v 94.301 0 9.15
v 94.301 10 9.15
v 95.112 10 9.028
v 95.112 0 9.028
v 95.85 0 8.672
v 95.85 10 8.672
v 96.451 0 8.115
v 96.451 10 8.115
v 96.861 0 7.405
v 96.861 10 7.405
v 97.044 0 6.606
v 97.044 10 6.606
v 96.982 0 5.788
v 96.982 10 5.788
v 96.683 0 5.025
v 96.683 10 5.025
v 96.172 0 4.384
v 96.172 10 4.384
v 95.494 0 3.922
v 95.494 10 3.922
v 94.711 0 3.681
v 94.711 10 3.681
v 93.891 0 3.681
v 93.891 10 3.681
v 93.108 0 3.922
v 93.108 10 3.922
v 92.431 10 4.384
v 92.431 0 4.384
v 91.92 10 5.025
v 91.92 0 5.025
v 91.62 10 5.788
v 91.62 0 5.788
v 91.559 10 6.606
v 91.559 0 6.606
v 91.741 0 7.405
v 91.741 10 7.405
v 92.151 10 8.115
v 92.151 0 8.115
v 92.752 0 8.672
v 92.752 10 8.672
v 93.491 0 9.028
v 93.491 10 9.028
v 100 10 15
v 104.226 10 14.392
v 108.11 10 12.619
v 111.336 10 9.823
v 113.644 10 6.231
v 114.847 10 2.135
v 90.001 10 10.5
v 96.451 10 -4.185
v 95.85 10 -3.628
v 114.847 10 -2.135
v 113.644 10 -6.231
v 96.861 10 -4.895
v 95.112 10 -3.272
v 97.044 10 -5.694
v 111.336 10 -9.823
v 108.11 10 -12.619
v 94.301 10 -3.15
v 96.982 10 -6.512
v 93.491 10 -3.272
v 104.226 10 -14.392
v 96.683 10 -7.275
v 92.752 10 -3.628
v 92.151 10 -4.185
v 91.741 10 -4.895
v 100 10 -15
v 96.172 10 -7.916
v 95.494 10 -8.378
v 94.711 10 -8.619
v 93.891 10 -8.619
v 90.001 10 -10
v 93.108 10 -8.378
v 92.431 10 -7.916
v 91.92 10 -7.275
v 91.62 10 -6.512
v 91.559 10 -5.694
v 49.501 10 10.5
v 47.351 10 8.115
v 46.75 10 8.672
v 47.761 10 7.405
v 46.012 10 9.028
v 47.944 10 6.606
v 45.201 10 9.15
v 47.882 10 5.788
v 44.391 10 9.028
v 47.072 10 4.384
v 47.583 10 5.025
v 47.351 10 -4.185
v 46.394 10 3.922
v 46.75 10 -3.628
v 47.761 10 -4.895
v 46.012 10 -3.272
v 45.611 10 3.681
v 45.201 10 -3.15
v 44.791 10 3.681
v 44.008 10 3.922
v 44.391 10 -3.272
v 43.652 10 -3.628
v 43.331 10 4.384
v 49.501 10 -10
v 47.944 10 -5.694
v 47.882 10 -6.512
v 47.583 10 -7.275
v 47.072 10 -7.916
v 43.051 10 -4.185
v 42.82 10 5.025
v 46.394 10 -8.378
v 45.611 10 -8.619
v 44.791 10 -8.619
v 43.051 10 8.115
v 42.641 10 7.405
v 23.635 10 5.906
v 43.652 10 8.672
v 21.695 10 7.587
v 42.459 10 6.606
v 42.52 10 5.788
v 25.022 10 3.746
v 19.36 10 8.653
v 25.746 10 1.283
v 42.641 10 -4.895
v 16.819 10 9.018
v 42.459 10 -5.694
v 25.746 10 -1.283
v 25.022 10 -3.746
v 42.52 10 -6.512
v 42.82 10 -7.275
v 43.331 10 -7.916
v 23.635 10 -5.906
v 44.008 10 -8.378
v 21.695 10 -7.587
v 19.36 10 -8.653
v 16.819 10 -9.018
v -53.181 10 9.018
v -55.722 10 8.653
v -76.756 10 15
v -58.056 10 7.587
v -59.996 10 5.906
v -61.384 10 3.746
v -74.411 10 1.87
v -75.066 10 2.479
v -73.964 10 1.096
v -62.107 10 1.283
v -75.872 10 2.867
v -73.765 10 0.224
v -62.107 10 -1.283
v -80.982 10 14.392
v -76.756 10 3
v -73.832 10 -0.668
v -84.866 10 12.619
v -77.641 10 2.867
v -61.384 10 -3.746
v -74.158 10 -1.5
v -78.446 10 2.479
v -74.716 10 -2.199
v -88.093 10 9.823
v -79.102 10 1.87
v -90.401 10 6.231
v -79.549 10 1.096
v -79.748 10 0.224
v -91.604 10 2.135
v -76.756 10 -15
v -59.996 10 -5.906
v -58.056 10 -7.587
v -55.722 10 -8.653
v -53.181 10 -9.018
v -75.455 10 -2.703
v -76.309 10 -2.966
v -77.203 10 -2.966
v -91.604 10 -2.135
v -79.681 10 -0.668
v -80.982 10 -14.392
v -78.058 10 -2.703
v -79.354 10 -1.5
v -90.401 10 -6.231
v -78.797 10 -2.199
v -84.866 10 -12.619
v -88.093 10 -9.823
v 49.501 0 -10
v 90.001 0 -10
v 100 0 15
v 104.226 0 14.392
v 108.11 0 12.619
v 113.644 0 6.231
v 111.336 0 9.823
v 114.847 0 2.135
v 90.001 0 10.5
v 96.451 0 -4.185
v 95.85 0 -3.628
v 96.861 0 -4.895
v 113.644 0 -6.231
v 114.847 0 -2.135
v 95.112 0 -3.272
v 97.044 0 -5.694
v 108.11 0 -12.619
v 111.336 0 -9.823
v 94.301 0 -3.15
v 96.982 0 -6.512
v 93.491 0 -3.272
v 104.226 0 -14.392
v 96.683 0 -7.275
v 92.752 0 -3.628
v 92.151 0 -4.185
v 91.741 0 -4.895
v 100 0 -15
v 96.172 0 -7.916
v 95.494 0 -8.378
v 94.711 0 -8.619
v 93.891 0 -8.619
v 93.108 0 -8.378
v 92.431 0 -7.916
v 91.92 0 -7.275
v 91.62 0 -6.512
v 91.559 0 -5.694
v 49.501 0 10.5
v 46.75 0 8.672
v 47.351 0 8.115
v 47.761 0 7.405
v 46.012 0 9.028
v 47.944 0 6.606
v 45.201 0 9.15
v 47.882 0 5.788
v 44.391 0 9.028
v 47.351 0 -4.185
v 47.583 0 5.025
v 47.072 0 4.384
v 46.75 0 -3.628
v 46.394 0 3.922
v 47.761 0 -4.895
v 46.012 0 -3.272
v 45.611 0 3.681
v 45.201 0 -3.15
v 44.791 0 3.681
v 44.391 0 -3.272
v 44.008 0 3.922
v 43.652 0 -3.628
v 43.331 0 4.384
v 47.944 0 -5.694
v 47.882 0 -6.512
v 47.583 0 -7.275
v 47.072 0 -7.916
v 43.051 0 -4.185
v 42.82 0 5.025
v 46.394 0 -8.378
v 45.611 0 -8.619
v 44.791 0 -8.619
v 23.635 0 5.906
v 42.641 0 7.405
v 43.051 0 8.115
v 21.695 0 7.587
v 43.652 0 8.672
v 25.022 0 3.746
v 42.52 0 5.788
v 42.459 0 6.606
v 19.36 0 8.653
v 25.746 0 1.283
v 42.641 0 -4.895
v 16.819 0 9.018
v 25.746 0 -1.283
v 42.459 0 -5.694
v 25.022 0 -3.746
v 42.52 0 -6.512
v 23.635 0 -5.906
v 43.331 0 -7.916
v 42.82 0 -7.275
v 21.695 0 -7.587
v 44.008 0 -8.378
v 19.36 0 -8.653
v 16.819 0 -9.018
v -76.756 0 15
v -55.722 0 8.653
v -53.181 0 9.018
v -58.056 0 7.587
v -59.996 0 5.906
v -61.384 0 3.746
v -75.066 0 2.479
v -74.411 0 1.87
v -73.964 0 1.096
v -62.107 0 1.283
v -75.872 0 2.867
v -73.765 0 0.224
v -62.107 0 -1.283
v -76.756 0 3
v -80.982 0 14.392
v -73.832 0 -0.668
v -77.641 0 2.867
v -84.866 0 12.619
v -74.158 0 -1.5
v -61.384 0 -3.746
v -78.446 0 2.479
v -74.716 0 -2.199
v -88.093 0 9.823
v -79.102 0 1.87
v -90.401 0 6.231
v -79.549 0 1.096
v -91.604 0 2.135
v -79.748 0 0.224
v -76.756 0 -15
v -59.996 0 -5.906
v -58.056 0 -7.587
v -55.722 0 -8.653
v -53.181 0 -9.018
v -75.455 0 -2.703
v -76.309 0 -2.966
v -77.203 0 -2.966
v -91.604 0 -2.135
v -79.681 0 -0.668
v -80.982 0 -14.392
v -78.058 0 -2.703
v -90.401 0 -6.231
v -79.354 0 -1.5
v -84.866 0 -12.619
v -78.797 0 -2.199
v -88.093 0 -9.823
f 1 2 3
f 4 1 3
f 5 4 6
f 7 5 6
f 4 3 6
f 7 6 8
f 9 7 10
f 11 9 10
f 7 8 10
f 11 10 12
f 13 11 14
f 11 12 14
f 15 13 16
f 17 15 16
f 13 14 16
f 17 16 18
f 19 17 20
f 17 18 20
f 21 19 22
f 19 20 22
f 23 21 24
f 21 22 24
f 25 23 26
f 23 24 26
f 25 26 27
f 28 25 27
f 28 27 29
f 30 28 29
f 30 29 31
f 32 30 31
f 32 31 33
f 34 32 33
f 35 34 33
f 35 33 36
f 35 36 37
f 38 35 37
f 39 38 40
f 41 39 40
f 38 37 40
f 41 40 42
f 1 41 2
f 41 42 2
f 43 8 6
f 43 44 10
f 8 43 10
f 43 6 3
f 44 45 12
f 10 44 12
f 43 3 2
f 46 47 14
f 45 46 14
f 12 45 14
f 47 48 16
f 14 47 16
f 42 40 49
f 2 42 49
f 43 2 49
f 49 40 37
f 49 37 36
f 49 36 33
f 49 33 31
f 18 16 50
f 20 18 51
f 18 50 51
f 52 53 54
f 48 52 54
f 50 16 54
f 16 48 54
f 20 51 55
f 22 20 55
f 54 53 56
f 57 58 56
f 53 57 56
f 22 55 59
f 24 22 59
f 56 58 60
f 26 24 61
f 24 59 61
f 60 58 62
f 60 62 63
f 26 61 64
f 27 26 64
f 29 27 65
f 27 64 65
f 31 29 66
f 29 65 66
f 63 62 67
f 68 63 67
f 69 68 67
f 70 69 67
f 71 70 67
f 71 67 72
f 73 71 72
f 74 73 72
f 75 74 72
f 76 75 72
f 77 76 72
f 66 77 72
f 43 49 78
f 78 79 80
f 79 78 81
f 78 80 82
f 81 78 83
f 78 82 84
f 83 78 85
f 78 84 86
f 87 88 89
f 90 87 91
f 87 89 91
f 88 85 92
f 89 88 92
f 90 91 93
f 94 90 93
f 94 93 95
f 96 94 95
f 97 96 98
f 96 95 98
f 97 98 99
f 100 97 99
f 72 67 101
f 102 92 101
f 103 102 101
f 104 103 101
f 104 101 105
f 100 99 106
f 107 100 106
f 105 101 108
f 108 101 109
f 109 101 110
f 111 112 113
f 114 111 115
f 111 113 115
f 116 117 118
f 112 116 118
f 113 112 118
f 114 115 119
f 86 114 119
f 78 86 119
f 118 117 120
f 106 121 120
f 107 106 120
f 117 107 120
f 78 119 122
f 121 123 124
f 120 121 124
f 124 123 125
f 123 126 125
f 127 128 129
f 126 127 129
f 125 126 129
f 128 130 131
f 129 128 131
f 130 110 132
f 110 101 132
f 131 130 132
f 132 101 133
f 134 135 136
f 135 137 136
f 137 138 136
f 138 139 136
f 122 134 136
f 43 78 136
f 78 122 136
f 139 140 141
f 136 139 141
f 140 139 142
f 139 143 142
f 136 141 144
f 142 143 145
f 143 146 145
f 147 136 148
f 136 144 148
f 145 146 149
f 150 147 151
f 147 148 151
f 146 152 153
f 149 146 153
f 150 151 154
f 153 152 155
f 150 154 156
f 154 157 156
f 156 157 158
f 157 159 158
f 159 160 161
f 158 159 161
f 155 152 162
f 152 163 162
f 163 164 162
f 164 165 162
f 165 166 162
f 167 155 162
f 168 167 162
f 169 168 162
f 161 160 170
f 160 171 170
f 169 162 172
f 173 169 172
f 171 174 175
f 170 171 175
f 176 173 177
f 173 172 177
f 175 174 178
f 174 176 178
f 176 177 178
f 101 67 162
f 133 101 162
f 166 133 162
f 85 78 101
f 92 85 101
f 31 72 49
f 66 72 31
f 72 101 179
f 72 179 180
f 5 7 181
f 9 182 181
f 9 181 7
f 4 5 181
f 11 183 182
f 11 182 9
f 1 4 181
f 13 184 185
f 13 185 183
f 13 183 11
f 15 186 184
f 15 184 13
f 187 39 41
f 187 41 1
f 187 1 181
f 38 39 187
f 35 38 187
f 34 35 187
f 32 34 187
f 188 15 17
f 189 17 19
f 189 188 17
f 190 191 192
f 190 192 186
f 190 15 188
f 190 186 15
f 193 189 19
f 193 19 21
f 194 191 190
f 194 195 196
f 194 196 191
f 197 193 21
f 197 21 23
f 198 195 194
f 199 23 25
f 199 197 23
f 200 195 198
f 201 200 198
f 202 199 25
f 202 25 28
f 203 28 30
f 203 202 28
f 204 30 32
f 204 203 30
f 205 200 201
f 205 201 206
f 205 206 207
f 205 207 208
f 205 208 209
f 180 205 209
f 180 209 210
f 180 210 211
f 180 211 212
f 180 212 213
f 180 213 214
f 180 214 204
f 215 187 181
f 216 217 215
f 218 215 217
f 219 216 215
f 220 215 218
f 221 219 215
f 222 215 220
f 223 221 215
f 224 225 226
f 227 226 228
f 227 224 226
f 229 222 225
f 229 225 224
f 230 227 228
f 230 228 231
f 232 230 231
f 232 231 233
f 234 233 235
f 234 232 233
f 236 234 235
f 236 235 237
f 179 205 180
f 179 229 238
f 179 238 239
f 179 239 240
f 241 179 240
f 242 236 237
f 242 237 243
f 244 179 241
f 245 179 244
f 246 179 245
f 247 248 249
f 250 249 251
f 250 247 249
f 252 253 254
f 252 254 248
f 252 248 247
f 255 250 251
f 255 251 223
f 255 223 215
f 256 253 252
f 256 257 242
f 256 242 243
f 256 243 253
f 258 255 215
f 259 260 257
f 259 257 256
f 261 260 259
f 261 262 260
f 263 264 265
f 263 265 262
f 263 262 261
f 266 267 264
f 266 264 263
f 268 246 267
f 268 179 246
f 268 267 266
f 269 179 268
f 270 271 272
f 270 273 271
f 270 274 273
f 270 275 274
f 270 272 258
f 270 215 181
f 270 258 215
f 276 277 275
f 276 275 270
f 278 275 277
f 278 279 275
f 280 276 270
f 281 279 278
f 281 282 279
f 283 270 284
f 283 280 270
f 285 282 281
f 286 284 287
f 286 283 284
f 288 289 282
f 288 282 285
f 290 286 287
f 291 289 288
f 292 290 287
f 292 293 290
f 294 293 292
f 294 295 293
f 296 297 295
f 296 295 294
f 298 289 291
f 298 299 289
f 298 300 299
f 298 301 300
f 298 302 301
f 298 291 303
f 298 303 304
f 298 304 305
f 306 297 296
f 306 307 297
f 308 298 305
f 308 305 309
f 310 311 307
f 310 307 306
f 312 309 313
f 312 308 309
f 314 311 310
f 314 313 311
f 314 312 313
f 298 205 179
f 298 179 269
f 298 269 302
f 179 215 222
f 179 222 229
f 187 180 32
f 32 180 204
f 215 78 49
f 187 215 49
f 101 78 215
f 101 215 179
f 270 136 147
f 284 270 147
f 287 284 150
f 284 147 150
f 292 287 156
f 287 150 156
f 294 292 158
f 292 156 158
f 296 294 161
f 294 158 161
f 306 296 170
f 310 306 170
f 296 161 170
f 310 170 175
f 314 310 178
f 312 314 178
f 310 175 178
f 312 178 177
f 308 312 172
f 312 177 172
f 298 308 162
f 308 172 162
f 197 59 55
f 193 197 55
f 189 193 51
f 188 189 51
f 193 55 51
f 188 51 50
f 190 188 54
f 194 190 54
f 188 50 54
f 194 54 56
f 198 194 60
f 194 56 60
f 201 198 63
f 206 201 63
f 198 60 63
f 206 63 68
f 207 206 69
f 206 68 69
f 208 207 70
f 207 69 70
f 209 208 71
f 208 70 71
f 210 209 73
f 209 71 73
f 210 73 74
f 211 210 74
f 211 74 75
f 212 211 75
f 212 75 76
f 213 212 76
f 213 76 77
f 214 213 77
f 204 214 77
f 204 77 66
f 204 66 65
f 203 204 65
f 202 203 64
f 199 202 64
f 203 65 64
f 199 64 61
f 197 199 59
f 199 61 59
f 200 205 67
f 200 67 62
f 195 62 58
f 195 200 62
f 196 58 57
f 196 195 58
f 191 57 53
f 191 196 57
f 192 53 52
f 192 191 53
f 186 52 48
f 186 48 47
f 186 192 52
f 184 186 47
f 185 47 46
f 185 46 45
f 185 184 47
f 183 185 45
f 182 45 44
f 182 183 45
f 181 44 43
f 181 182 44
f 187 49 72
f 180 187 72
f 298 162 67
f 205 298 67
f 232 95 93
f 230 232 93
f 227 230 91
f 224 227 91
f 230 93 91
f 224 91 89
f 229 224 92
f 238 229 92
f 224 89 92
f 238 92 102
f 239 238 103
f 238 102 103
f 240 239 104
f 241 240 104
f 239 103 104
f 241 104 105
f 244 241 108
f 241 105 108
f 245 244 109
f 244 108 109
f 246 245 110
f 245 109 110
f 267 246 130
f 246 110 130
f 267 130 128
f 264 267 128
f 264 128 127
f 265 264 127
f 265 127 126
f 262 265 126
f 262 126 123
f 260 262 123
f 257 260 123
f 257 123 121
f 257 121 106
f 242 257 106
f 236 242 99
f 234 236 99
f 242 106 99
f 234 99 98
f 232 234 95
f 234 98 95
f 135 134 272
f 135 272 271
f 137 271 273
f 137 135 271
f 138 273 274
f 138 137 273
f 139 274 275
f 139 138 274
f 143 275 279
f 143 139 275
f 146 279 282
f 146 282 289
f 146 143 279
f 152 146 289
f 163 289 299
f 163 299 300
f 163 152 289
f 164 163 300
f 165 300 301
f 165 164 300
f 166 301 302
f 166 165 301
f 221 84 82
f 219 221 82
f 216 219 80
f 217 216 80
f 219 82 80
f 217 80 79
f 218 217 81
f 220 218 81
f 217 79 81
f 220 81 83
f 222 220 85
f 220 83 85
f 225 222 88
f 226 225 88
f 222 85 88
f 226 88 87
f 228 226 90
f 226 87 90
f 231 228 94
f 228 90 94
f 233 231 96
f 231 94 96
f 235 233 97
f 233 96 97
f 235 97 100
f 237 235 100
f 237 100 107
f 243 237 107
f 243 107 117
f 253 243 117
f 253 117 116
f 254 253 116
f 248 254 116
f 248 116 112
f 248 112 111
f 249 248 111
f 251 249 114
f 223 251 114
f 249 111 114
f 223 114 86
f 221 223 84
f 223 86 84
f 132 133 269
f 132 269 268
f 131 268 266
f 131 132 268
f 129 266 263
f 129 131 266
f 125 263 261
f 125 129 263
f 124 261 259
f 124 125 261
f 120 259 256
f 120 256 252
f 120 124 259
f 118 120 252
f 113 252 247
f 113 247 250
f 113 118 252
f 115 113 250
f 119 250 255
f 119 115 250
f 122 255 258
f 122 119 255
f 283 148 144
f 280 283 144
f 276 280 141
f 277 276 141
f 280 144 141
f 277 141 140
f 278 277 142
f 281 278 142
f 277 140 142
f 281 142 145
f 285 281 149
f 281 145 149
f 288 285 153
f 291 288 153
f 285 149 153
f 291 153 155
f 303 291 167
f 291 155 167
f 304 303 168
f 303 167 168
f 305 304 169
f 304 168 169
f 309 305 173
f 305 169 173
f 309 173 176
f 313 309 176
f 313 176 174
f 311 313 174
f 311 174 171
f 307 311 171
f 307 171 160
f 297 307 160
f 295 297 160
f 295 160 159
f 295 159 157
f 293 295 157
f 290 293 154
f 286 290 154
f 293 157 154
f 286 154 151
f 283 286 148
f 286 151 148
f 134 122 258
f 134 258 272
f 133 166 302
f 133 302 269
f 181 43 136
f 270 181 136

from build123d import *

# Parameters (mm, degrees)
SKETCH2_R           = 1.45
BOSS_EXTRUDE3_DEPTH = 10
SKETCH10_W          = 7.047144721
SKETCH10_H          = 19.860135122
BOSS_EXTRUDE7_DEPTH = 10
SKETCH12_R          = 1.45
BOSS_EXTRUDE8_DEPTH = 10
SKETCH13_R          = 2.925
CUT_EXTRUDE8_DEPTH  = 2
CUT_EXTRUDE9_DEPTH  = 10
SKETCH16_R          = 3
CUT_EXTRUDE10_DEPTH = 10
SKETCH6_R           = 2.75
SKETCH6_W           = 40.5
SKETCH6_H           = 20.5
CUT_EXTRUDE11_DEPTH = 10
SKETCH17_R          = 2.75
CUT_EXTRUDE12_DEPTH = 10


with BuildPart() as part:
    # Sketch2 → Boss-Extrude3 (new body)
    with BuildSketch(Plane(origin=(0, 0, 0), x_dir=(1, 0, 0), z_dir=(0, 1, 0))):
        with BuildLine():
            Line((0, 15), (100, 15))
            ThreePointArc((100, 15), (115, 0), (100, -15))
            Line((100, -15), (0, -15))
            ThreePointArc((0, -15), (-15, 0), (0, 15))
        make_face()
        with Locations(Location((0, 0, 0), (0, 0, 270))):
            Circle(SKETCH2_R, mode=Mode.SUBTRACT)
    extrude(amount=BOSS_EXTRUDE3_DEPTH)

    # Sketch10 → Boss-Extrude7 (add)
    with BuildSketch(Plane(origin=(0, 10, 0), x_dir=(1, 0, 0), z_dir=(0, 1, 0))):
        with Locations((94.781401452, 0.828180391)):
            Rectangle(SKETCH10_W, SKETCH10_H)
    extrude(amount=-BOSS_EXTRUDE7_DEPTH)

    # Sketch12 → Boss-Extrude8 (add)
    with BuildSketch(Plane(origin=(0, 10, 0), x_dir=(1, 0, 0), z_dir=(0, 1, 0))):
        with BuildLine():
            Line((-76.756351439, 15), (12.176052336, 15))
            ThreePointArc((12.176052336, 15), (27.176052336, 0), (12.176052336, -15))
            Line((12.176052336, -15), (-76.756351439, -15))
            ThreePointArc((-76.756351439, -15), (-91.756351439, 0), (-76.756351439, 15))
        make_face()
        with Locations(Location((-76.756351439, 0, 0), (0, 0, 270))):
            Circle(SKETCH12_R, mode=Mode.SUBTRACT)
    extrude(amount=-BOSS_EXTRUDE8_DEPTH)

    # Sketch13 → Cut-Extrude8 (cut)
    with BuildSketch(Plane(origin=(0, 10, 0), x_dir=(1, 0, 0), z_dir=(0, 1, 0))):
        with Locations(Location((-76.756351439, 0, 0), (0, 0, 270))):
            Circle(SKETCH13_R)
    extrude(amount=-CUT_EXTRUDE8_DEPTH, mode=Mode.SUBTRACT)

    # Sketch15 → Cut-Extrude9 (cut)
    with BuildSketch(Plane(origin=(0, 10, 0), x_dir=(1, 0, 0), z_dir=(0, 1, 0))):
        with BuildLine():
            Line((-53.180879761, 9.018176556), (16.819120239, 9.018176556))
            ThreePointArc((16.819120239, 9.018176556), (25.837296795, 0), (16.819120239, -9.018176556))
            Line((16.819120239, -9.018176556), (-53.180879761, -9.018176556))
            ThreePointArc((-53.180879761, -9.018176556), (-62.199056317, 0), (-53.180879761, 9.018176556))
        make_face()
    extrude(amount=-CUT_EXTRUDE9_DEPTH, mode=Mode.SUBTRACT)

    # Sketch16 → Cut-Extrude10 (cut)
    with BuildSketch(Plane(origin=(0, 10, 0), x_dir=(1, 0, 0), z_dir=(0, 1, 0))):
        with Locations(Location((-76.756351439, 0, 0), (0, 0, 270))):
            Circle(SKETCH16_R)
    extrude(amount=-CUT_EXTRUDE10_DEPTH, mode=Mode.SUBTRACT)

    # Sketch6 → Cut-Extrude11 (cut)
    with BuildSketch(Plane(origin=(0, 10, 0), x_dir=(1, 0, 0), z_dir=(0, 1, 0))):
        with Locations(Location((94.301250031, 5.9, 0), (0, 0, 270))):
            Circle(SKETCH6_R)
        with Locations(Location((94.301250031, -6.4, 0), (0, 0, 270))):
            Circle(SKETCH6_R)
        with Locations((69.751250031, -0.25)):
            Rectangle(SKETCH6_W, SKETCH6_H)
    extrude(amount=-CUT_EXTRUDE11_DEPTH, mode=Mode.SUBTRACT)

    # Sketch17 → Cut-Extrude12 (cut)
    with BuildSketch(Plane(origin=(0, 10, 0), x_dir=(1, 0, 0), z_dir=(0, 1, 0))):
        with Locations(Location((45.201250031, 5.9, 0), (0, 0, 270))):
            Circle(SKETCH17_R)
        with Locations(Location((45.201250031, -6.4, 0), (0, 0, 270))):
            Circle(SKETCH17_R)
    extrude(amount=-CUT_EXTRUDE12_DEPTH, mode=Mode.SUBTRACT)


solid = part.part
